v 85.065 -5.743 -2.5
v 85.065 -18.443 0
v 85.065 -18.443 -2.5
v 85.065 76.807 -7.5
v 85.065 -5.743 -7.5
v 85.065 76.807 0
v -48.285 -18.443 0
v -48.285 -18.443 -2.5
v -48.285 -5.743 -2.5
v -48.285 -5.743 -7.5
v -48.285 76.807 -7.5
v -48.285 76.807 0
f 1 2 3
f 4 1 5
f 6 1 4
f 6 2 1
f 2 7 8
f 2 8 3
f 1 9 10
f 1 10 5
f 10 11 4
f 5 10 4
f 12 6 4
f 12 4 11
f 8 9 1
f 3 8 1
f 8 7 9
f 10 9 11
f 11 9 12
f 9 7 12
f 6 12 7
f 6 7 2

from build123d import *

# Parameters (mm, degrees)
F0_W     = 127
F0_H     = 79.375
F1_DEPTH = 7.5
F0_W_2   = 3.175
F0_H_2   = 12.7
F2_DEPTH = 2.5


with BuildPart() as f1:
    # F0 (on Top) → F1 (new body)
    with BuildSketch(Plane.XY):
        Polygon((85.0653162807, 76.807467067), (-48.2846837193, 76.807467067), (-48.2846837193, -5.742532933), (-45.1096837193, -5.742532933), (-45.1096837193, 73.632467067), (81.8903162807, 73.632467067), (81.8903162807, -5.742532933), (85.0653162807, -5.742532933), align=None)
        with Locations((18.3903162807, 33.944967067)):
            Rectangle(F0_W, F0_H)
    extrude(amount=-F1_DEPTH)

    # F0 (on Top) → F2 (join)
    with BuildSketch(Plane.XY):
        with Locations((-46.6971837193, -12.092532933)):
            Rectangle(F0_W_2, F0_H_2)
        with Locations((83.4778162807, -12.092532933)):
            Rectangle(F0_W_2, F0_H_2)
        with Locations((18.3903162807, -12.092532933)):
            Rectangle(F0_W, F0_H_2)
    extrude(amount=-F2_DEPTH)


solid = f1.part
